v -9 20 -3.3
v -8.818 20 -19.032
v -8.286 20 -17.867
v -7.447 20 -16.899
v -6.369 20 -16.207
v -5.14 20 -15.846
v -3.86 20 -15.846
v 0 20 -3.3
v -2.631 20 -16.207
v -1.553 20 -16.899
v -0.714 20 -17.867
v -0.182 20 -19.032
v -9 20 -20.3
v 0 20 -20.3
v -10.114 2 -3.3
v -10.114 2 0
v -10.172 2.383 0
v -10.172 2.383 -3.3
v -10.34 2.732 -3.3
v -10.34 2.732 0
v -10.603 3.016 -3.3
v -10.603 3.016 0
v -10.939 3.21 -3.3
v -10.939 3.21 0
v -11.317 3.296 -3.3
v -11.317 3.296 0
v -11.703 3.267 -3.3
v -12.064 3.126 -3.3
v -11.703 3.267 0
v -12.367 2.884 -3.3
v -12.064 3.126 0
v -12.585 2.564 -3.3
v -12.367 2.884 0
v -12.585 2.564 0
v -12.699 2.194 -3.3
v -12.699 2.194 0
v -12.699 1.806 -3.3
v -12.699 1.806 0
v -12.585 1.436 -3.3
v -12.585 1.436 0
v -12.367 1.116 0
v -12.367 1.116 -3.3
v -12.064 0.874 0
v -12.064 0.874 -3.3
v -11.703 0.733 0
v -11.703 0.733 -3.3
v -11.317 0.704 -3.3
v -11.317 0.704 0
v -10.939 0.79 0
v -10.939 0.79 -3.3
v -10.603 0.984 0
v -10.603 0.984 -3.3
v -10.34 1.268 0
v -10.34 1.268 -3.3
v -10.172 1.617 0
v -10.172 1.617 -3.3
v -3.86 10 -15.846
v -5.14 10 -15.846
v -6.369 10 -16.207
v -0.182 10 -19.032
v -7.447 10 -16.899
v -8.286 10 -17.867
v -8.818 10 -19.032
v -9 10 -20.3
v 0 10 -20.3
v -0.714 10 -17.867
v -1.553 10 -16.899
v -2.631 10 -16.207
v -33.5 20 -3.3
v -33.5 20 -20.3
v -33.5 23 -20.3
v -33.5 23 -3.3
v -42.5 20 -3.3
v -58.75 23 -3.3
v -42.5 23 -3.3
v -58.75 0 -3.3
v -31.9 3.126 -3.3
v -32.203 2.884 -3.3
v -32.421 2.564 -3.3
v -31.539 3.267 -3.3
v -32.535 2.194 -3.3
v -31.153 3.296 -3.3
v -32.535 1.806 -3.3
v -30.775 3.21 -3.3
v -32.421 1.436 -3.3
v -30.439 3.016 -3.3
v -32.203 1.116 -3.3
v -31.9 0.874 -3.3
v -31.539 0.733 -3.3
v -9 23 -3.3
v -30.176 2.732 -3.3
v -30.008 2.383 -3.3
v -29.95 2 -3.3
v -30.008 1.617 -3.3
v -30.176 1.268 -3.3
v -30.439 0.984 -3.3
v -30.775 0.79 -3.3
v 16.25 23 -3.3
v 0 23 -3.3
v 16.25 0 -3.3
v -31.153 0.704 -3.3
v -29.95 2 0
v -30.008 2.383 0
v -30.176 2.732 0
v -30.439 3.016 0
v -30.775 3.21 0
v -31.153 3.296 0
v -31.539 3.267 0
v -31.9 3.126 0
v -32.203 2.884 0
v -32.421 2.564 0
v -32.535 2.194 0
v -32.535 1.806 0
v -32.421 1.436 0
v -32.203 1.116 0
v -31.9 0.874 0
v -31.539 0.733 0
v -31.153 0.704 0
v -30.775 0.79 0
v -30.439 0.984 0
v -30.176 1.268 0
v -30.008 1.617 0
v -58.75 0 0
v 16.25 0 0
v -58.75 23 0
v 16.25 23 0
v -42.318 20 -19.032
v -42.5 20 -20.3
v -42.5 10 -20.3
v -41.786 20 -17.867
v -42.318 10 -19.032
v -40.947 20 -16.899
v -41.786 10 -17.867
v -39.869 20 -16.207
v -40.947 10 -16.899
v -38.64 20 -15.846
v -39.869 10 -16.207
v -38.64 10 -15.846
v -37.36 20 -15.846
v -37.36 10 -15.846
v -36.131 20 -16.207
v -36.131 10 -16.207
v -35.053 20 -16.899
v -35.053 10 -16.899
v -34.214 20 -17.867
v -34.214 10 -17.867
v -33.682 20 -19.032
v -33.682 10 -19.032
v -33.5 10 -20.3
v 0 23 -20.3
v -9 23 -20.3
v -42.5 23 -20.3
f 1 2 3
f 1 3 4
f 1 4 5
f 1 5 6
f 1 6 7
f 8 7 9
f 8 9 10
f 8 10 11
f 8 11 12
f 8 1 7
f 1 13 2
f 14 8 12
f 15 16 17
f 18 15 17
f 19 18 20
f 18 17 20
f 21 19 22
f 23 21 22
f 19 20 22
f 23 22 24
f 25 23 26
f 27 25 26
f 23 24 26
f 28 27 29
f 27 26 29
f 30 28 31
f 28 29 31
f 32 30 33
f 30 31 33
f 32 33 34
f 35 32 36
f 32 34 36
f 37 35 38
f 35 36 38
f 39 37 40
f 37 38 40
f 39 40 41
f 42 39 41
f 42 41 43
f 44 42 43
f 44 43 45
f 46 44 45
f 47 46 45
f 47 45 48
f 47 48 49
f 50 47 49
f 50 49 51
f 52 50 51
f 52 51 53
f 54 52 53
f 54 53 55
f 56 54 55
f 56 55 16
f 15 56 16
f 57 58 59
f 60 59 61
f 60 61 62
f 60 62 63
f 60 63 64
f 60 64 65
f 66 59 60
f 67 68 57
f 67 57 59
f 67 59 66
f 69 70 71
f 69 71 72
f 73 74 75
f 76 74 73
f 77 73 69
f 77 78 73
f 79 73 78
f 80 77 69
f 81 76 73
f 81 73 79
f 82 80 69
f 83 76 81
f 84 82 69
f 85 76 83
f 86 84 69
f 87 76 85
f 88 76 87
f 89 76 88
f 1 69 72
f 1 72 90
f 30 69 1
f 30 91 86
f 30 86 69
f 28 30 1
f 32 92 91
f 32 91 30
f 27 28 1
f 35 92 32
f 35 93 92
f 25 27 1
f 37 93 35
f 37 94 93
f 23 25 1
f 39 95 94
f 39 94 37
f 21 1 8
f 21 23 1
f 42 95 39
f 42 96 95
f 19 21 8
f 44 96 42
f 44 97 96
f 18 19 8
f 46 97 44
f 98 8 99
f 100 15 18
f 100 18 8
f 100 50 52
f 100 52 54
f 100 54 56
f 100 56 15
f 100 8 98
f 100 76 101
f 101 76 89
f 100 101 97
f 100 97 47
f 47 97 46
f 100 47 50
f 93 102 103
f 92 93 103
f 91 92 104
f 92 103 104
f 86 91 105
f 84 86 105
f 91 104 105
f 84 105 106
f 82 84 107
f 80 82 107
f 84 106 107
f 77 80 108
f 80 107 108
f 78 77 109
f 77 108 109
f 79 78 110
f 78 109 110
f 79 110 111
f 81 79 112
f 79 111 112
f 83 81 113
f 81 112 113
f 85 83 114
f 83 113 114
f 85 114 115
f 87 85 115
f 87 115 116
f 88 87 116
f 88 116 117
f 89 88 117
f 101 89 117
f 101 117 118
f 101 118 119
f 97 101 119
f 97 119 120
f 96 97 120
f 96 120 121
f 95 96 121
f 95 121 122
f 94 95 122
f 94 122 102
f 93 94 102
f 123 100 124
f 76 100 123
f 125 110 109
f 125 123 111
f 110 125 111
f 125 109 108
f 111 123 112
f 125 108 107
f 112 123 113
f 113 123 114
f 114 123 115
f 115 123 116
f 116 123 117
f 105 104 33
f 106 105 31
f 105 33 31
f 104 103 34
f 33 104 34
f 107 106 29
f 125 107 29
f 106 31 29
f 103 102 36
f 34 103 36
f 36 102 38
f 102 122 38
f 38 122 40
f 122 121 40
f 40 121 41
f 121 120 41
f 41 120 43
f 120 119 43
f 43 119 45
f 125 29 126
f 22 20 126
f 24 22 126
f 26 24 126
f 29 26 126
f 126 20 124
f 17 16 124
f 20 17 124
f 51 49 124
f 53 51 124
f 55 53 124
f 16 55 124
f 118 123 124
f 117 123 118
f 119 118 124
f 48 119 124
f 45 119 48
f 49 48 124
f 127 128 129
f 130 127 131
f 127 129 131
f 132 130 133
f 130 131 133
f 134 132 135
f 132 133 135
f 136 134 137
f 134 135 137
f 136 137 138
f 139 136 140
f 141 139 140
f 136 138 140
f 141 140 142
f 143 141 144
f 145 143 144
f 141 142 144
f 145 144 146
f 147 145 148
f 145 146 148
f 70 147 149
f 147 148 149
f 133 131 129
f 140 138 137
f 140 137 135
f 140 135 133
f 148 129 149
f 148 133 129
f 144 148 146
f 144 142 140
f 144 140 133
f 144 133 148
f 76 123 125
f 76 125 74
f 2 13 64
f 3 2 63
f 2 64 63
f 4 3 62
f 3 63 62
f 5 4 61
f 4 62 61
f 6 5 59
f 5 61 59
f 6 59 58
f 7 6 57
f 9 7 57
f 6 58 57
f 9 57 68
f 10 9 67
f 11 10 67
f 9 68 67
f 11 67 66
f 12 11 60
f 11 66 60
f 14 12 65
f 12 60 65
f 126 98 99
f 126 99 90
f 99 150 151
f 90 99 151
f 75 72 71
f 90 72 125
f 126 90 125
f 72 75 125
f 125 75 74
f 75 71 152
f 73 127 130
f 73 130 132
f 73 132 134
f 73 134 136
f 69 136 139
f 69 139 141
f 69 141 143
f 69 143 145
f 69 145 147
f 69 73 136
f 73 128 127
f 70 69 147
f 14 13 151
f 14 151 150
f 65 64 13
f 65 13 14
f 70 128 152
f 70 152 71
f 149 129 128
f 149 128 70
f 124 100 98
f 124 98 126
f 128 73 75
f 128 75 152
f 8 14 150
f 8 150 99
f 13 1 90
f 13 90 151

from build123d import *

# Parameters (mm, degrees)
EXTRUDE_1_DEPTH     = 23
CUT_EXTRUDE_3_DEPTH = 20
SKETCH_3_R          = 1.3
CUT_EXTRUDE_4_DEPTH = 4
SKETCH_4_W          = 42.5
SKETCH_4_H          = 6.002604642
CUT_EXTRUDE_5_DEPTH = 10


with BuildPart() as part:
    # Эскиз1 → Бобышка-Вытянуть1 (new body)
    with BuildSketch(Plane(origin=(0, 0, 0), x_dir=(1, 0, 0), z_dir=(0, 1, 0))):
        Polygon((0, 0), (-42.5, 0), (-58.75, 0), (-58.75, 3.3), (-42.5, 3.3), (-42.5, 20.3), (-33.5, 20.3), (-33.5, 3.3), (-9, 3.3), (-9, 20.3), (0, 20.3), (0, 3.3), (16.25, 3.3), (16.25, 0), align=None)
    extrude(amount=EXTRUDE_1_DEPTH)

    # Эскиз2 → Вырез-Вытянуть3 (cut)
    with BuildSketch(Plane.XZ):
        with BuildLine():
            Line((-9, -3.3), (-9, -20.3))
            ThreePointArc((-9, -20.3), (-4.5, -15.8), (0, -20.3))
            Line((0, -20.3), (0, -3.3))
            Line((0, -3.3), (-9, -3.3))
        make_face()
        with BuildLine():
            Line((-33.5, -3.3), (-42.5, -3.3))
            Line((-42.5, -3.3), (-42.5, -20.3))
            ThreePointArc((-42.5, -20.3), (-38, -15.8), (-33.5, -20.3))
            Line((-33.5, -20.3), (-33.5, -3.3))
        make_face()
    extrude(amount=-CUT_EXTRUDE_3_DEPTH, mode=Mode.SUBTRACT)

    # Эскиз3 → Вырез-Вытянуть4 (cut)
    with BuildSketch(Plane.XY):
        with Locations((-31.25, 2)):
            Circle(SKETCH_3_R)
        with Locations((-11.41399061, 2)):
            Circle(SKETCH_3_R)
    extrude(amount=-CUT_EXTRUDE_4_DEPTH, mode=Mode.SUBTRACT)

    # Эскиз4 → Вырез-Вытянуть5 (cut)
    with BuildSketch(Plane.XZ):
        with Locations((-21.25, -17.298697679)):
            Rectangle(SKETCH_4_W, SKETCH_4_H)
    extrude(amount=-CUT_EXTRUDE_5_DEPTH, mode=Mode.SUBTRACT)


solid = part.part
